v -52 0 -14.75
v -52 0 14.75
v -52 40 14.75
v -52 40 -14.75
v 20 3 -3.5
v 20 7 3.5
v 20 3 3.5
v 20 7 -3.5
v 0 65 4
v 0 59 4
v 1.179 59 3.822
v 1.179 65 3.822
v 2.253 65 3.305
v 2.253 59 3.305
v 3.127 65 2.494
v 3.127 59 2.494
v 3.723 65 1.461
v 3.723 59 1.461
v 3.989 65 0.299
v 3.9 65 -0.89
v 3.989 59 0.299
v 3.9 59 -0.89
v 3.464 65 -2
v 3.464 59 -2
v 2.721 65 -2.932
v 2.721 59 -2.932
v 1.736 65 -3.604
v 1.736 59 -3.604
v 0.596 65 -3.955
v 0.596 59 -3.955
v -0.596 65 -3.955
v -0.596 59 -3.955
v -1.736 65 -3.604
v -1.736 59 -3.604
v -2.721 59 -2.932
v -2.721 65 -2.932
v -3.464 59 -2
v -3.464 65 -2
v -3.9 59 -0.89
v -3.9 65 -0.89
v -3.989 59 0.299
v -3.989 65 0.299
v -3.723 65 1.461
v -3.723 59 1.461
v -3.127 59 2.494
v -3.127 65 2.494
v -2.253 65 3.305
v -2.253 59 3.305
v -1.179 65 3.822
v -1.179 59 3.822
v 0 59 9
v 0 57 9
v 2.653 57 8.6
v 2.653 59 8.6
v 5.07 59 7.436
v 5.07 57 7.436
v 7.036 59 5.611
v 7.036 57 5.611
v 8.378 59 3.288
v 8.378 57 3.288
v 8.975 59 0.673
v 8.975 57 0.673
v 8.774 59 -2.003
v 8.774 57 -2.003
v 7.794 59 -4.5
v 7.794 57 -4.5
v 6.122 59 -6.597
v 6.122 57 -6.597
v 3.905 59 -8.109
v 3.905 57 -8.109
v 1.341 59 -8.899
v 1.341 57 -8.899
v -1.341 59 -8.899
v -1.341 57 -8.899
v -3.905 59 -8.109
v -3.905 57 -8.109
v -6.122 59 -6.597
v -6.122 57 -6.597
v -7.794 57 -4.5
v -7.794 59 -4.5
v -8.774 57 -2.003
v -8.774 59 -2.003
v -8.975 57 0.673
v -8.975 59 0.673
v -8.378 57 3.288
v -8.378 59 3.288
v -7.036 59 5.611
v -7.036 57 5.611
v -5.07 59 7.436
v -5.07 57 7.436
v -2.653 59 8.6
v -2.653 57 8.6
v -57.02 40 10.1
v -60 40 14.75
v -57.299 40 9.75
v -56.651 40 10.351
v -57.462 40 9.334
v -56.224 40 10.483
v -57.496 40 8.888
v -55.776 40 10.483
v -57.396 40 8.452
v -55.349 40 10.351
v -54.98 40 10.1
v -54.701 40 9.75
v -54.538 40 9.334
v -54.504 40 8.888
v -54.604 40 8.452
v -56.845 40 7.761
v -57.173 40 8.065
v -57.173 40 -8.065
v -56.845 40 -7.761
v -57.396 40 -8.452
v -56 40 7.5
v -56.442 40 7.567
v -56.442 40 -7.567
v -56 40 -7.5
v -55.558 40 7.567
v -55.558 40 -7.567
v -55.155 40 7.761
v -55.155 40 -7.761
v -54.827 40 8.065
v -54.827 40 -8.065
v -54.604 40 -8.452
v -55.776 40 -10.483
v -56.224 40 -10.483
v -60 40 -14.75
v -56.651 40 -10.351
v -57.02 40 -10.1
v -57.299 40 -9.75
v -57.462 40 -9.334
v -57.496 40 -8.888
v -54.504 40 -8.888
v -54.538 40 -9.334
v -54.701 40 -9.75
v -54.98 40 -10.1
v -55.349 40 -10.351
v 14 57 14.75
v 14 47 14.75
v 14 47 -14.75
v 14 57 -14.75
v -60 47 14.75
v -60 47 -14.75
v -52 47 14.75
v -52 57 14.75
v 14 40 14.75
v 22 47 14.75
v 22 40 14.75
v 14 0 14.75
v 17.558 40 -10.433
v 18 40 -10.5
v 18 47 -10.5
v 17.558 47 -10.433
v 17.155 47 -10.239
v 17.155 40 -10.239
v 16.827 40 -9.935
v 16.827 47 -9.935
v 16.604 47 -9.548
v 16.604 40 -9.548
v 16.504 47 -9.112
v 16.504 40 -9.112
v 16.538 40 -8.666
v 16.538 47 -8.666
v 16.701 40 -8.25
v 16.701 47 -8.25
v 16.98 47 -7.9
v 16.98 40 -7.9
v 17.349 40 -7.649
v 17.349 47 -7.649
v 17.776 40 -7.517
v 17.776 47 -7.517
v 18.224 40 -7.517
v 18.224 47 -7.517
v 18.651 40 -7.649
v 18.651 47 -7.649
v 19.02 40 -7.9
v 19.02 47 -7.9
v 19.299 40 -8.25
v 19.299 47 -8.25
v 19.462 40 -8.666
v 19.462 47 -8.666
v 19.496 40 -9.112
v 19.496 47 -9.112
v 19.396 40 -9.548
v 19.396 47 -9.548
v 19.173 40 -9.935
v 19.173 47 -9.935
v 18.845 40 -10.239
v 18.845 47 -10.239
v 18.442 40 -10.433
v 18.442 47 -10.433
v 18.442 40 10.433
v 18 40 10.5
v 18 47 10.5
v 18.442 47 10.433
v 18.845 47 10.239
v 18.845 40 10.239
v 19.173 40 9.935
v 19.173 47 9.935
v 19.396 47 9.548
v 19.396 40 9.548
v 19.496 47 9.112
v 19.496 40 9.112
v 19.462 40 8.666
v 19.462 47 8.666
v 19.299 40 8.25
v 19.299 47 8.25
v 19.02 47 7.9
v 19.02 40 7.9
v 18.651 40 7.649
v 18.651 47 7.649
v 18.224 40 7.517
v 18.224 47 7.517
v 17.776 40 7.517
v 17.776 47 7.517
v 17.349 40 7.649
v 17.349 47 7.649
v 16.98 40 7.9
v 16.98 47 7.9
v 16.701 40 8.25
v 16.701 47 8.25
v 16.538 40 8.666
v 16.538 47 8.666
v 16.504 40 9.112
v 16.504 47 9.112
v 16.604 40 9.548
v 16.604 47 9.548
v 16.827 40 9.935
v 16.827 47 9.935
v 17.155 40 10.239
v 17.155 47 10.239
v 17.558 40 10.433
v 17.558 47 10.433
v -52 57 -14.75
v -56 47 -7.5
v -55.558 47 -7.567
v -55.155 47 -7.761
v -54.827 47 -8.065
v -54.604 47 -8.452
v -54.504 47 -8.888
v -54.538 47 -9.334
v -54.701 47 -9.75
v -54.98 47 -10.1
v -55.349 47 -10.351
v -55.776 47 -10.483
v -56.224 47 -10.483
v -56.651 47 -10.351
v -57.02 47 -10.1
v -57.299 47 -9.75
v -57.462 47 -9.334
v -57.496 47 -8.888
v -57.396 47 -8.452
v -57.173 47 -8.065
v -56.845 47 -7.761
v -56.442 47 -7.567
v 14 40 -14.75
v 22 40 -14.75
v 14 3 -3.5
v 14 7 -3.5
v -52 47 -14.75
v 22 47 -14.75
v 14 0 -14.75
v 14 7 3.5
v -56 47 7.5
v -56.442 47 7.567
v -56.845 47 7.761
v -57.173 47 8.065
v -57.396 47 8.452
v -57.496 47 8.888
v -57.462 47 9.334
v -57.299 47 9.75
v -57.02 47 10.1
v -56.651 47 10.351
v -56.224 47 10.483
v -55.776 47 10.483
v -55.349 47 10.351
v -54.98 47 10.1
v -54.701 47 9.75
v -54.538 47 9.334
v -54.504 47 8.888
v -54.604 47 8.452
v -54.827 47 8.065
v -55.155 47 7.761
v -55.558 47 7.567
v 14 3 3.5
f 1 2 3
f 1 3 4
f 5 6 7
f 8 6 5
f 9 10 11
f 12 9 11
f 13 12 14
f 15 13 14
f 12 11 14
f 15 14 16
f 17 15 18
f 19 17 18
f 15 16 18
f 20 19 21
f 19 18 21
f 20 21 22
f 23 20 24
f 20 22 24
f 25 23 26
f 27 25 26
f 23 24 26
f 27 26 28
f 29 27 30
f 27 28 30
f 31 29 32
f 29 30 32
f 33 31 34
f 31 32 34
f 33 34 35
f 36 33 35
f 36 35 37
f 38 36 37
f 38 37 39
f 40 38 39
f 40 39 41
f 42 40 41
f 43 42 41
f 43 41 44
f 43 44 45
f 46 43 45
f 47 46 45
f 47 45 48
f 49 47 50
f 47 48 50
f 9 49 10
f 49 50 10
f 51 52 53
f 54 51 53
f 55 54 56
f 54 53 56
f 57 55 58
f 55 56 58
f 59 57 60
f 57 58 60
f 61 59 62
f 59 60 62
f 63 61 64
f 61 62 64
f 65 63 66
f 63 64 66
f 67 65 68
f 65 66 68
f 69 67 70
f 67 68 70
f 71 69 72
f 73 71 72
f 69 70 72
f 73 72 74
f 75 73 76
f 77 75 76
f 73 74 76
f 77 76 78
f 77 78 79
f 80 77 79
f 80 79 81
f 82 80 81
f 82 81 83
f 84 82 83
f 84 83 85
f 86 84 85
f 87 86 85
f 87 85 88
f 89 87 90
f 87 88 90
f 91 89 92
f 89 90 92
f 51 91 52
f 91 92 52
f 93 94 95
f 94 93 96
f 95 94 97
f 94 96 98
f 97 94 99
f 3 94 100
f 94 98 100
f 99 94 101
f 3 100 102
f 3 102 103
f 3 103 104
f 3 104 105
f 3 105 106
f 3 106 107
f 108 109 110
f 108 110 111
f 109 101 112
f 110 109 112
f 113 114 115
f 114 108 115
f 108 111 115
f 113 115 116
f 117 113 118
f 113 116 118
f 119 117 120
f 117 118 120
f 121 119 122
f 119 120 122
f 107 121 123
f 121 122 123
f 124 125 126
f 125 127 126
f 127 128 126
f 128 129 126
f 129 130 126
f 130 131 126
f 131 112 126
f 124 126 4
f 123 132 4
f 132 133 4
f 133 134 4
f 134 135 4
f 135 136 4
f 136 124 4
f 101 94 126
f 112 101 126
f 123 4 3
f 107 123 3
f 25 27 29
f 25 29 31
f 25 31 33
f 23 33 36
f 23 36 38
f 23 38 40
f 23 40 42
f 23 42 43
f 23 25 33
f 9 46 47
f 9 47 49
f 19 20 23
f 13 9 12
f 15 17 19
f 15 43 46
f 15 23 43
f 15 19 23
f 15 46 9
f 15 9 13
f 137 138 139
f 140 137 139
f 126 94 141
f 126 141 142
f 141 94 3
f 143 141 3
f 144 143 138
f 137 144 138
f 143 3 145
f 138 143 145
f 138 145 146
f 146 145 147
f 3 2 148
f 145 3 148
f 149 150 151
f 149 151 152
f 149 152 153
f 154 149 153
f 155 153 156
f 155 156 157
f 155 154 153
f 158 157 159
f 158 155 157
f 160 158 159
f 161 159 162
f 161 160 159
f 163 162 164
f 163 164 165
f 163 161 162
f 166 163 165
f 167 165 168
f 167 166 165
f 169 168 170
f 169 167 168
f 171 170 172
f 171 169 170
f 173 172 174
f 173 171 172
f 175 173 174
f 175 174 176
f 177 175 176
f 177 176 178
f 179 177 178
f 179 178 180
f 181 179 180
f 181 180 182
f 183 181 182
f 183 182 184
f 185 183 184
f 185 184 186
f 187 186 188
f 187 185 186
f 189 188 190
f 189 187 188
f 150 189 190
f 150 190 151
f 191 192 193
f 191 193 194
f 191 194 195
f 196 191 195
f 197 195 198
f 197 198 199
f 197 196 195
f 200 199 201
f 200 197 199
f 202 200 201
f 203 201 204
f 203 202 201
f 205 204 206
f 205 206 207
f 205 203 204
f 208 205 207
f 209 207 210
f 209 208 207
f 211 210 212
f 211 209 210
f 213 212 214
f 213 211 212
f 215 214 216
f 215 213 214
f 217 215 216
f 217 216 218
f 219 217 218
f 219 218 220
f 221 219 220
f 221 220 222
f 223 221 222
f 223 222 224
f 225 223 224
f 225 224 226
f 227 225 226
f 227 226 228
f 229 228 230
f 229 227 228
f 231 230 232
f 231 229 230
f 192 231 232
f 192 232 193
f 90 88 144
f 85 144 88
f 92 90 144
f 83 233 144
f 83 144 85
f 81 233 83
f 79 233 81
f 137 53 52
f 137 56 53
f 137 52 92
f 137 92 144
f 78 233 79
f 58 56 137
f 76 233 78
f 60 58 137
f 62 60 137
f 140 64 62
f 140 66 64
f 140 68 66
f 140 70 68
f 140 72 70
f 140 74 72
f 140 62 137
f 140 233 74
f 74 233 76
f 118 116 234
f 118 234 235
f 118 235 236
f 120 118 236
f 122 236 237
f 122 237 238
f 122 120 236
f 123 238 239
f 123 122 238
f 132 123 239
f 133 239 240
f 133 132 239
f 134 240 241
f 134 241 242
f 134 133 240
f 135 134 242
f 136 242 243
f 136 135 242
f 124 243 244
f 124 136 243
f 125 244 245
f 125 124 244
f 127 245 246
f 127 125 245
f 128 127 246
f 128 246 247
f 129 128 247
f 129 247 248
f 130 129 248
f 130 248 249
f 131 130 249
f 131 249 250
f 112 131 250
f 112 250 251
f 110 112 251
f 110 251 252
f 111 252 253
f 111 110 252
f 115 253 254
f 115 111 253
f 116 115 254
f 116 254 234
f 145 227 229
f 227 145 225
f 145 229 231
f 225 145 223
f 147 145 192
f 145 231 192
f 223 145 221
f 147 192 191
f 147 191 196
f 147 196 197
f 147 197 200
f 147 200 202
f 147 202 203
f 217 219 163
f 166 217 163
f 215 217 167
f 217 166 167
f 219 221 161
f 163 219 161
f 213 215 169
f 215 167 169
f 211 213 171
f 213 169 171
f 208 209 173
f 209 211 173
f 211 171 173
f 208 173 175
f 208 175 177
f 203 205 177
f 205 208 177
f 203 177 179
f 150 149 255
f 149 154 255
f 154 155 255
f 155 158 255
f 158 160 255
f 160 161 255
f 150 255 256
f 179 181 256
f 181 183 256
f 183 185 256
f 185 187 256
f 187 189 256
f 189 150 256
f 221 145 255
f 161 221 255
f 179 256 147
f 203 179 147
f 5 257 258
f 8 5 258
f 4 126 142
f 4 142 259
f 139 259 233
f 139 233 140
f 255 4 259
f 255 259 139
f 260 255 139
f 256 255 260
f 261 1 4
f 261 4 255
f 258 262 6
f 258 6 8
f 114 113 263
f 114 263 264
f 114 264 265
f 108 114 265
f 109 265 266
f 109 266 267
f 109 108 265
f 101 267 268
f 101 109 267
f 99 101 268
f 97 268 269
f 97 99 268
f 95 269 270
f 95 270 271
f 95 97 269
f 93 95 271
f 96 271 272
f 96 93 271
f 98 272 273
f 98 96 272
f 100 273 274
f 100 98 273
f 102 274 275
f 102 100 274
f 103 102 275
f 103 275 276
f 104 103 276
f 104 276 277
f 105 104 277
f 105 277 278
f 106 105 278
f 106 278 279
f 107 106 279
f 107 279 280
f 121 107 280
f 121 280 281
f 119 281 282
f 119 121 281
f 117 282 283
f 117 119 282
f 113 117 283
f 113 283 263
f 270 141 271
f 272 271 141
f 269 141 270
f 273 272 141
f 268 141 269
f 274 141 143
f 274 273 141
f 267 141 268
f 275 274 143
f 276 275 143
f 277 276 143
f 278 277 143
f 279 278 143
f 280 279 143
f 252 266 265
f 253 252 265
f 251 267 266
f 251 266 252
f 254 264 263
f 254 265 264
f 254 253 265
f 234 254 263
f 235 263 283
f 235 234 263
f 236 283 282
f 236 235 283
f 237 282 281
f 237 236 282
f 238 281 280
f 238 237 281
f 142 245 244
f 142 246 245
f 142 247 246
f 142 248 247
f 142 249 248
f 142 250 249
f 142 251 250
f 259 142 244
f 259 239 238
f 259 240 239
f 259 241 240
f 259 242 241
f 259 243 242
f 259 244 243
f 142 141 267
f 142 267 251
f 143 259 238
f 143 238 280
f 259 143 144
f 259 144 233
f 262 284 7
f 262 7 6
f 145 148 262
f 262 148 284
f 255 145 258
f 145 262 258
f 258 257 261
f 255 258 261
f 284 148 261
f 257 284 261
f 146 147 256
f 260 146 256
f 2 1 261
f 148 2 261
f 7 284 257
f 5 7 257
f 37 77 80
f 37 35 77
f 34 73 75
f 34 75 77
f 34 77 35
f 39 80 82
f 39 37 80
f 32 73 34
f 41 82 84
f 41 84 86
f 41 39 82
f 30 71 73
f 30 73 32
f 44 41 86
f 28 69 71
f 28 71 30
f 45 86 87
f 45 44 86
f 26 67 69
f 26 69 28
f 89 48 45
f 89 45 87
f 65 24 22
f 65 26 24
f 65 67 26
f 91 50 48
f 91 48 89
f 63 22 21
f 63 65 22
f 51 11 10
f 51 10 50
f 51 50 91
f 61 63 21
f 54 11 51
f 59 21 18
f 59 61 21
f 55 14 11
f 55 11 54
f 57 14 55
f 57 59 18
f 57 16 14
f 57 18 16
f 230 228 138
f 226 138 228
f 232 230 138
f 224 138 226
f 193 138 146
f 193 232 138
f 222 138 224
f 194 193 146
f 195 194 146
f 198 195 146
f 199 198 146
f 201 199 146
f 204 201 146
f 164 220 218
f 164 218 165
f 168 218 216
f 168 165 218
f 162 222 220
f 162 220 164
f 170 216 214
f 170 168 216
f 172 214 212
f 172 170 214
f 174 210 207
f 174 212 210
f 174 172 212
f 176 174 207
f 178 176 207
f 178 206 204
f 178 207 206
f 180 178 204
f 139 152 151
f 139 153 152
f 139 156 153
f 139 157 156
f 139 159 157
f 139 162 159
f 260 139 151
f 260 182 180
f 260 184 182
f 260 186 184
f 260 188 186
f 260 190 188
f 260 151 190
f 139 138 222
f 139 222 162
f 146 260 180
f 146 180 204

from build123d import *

# Parameters (mm, degrees)
ESQUISSE1_W        = 66
ESQUISSE1_H        = 29.5
BOSS_EXTRU_1_DEPTH = 57
ESQUISSE2_R        = 9
BOSS_EXTRU_2_DEPTH = 2
ESQUISSE3_R        = 4
BOSS_EXTRU_3_DEPTH = 6
BOSS_EXTRU_4_START = 40
ESQUISSE4_W        = 82
ESQUISSE4_H        = 29.5
ESQUISSE4_R        = 1.5
BOSS_EXTRU_4_DEPTH = 7
ESQUISSE5_W        = 7
ESQUISSE5_H        = 4
BOSS_EXTRU_5_DEPTH = 6


with BuildPart() as part:
    # Esquisse1 → Boss.-Extru.1 (new body)
    with BuildSketch(Plane(origin=(0, 0, 0), x_dir=(1, 0, 0), z_dir=(0, 1, 0))):
        with Locations((-19, 0)):
            Rectangle(ESQUISSE1_W, ESQUISSE1_H)
    extrude(amount=BOSS_EXTRU_1_DEPTH)

    # Esquisse2 → Boss.-Extru.2 (add)
    with BuildSketch(Plane(origin=(0, 57, 0), x_dir=(1, 0, 0), z_dir=(0, 1, 0))):
        with Locations(Location((0, 0, 0), (0, 0, 270))):
            Circle(ESQUISSE2_R)
    extrude(amount=BOSS_EXTRU_2_DEPTH)

    # Esquisse3 → Boss.-Extru.3 (add)
    with BuildSketch(Plane(origin=(0, 59, 0), x_dir=(1, 0, 0), z_dir=(0, 1, 0))):
        with Locations(Location((0, 0, 0), (0, 0, 270))):
            Circle(ESQUISSE3_R)
    extrude(amount=BOSS_EXTRU_3_DEPTH)

    # Esquisse4 → Boss.-Extru.4 (add)
    with BuildSketch(Plane(origin=(0, 0, 0), x_dir=(1, 0, 0), z_dir=(0, 1, 0)).offset(BOSS_EXTRU_4_START)):
        with Locations((-19, 0)):
            Rectangle(ESQUISSE4_W, ESQUISSE4_H)
        with Locations(Location((-56, 9, 0), (0, 0, 270))):
            Circle(ESQUISSE4_R, mode=Mode.SUBTRACT)
        with Locations(Location((-56, -9, 0), (0, 0, 90))):
            Circle(ESQUISSE4_R, mode=Mode.SUBTRACT)
        with Locations(Location((18, -9, 0), (0, 0, 270))):
            Circle(ESQUISSE4_R, mode=Mode.SUBTRACT)
        with Locations(Location((18, 9, 0), (0, 0, 90))):
            Circle(ESQUISSE4_R, mode=Mode.SUBTRACT)
    extrude(amount=BOSS_EXTRU_4_DEPTH)

    # Esquisse5 → Boss.-Extru.5 (add)
    with BuildSketch(Plane(origin=(14, 0, 0), x_dir=(0, 0, -1), z_dir=(1, 0, 0))):
        with Locations((0, 5)):
            Rectangle(ESQUISSE5_W, ESQUISSE5_H)
    extrude(amount=BOSS_EXTRU_5_DEPTH)


solid = part.part
